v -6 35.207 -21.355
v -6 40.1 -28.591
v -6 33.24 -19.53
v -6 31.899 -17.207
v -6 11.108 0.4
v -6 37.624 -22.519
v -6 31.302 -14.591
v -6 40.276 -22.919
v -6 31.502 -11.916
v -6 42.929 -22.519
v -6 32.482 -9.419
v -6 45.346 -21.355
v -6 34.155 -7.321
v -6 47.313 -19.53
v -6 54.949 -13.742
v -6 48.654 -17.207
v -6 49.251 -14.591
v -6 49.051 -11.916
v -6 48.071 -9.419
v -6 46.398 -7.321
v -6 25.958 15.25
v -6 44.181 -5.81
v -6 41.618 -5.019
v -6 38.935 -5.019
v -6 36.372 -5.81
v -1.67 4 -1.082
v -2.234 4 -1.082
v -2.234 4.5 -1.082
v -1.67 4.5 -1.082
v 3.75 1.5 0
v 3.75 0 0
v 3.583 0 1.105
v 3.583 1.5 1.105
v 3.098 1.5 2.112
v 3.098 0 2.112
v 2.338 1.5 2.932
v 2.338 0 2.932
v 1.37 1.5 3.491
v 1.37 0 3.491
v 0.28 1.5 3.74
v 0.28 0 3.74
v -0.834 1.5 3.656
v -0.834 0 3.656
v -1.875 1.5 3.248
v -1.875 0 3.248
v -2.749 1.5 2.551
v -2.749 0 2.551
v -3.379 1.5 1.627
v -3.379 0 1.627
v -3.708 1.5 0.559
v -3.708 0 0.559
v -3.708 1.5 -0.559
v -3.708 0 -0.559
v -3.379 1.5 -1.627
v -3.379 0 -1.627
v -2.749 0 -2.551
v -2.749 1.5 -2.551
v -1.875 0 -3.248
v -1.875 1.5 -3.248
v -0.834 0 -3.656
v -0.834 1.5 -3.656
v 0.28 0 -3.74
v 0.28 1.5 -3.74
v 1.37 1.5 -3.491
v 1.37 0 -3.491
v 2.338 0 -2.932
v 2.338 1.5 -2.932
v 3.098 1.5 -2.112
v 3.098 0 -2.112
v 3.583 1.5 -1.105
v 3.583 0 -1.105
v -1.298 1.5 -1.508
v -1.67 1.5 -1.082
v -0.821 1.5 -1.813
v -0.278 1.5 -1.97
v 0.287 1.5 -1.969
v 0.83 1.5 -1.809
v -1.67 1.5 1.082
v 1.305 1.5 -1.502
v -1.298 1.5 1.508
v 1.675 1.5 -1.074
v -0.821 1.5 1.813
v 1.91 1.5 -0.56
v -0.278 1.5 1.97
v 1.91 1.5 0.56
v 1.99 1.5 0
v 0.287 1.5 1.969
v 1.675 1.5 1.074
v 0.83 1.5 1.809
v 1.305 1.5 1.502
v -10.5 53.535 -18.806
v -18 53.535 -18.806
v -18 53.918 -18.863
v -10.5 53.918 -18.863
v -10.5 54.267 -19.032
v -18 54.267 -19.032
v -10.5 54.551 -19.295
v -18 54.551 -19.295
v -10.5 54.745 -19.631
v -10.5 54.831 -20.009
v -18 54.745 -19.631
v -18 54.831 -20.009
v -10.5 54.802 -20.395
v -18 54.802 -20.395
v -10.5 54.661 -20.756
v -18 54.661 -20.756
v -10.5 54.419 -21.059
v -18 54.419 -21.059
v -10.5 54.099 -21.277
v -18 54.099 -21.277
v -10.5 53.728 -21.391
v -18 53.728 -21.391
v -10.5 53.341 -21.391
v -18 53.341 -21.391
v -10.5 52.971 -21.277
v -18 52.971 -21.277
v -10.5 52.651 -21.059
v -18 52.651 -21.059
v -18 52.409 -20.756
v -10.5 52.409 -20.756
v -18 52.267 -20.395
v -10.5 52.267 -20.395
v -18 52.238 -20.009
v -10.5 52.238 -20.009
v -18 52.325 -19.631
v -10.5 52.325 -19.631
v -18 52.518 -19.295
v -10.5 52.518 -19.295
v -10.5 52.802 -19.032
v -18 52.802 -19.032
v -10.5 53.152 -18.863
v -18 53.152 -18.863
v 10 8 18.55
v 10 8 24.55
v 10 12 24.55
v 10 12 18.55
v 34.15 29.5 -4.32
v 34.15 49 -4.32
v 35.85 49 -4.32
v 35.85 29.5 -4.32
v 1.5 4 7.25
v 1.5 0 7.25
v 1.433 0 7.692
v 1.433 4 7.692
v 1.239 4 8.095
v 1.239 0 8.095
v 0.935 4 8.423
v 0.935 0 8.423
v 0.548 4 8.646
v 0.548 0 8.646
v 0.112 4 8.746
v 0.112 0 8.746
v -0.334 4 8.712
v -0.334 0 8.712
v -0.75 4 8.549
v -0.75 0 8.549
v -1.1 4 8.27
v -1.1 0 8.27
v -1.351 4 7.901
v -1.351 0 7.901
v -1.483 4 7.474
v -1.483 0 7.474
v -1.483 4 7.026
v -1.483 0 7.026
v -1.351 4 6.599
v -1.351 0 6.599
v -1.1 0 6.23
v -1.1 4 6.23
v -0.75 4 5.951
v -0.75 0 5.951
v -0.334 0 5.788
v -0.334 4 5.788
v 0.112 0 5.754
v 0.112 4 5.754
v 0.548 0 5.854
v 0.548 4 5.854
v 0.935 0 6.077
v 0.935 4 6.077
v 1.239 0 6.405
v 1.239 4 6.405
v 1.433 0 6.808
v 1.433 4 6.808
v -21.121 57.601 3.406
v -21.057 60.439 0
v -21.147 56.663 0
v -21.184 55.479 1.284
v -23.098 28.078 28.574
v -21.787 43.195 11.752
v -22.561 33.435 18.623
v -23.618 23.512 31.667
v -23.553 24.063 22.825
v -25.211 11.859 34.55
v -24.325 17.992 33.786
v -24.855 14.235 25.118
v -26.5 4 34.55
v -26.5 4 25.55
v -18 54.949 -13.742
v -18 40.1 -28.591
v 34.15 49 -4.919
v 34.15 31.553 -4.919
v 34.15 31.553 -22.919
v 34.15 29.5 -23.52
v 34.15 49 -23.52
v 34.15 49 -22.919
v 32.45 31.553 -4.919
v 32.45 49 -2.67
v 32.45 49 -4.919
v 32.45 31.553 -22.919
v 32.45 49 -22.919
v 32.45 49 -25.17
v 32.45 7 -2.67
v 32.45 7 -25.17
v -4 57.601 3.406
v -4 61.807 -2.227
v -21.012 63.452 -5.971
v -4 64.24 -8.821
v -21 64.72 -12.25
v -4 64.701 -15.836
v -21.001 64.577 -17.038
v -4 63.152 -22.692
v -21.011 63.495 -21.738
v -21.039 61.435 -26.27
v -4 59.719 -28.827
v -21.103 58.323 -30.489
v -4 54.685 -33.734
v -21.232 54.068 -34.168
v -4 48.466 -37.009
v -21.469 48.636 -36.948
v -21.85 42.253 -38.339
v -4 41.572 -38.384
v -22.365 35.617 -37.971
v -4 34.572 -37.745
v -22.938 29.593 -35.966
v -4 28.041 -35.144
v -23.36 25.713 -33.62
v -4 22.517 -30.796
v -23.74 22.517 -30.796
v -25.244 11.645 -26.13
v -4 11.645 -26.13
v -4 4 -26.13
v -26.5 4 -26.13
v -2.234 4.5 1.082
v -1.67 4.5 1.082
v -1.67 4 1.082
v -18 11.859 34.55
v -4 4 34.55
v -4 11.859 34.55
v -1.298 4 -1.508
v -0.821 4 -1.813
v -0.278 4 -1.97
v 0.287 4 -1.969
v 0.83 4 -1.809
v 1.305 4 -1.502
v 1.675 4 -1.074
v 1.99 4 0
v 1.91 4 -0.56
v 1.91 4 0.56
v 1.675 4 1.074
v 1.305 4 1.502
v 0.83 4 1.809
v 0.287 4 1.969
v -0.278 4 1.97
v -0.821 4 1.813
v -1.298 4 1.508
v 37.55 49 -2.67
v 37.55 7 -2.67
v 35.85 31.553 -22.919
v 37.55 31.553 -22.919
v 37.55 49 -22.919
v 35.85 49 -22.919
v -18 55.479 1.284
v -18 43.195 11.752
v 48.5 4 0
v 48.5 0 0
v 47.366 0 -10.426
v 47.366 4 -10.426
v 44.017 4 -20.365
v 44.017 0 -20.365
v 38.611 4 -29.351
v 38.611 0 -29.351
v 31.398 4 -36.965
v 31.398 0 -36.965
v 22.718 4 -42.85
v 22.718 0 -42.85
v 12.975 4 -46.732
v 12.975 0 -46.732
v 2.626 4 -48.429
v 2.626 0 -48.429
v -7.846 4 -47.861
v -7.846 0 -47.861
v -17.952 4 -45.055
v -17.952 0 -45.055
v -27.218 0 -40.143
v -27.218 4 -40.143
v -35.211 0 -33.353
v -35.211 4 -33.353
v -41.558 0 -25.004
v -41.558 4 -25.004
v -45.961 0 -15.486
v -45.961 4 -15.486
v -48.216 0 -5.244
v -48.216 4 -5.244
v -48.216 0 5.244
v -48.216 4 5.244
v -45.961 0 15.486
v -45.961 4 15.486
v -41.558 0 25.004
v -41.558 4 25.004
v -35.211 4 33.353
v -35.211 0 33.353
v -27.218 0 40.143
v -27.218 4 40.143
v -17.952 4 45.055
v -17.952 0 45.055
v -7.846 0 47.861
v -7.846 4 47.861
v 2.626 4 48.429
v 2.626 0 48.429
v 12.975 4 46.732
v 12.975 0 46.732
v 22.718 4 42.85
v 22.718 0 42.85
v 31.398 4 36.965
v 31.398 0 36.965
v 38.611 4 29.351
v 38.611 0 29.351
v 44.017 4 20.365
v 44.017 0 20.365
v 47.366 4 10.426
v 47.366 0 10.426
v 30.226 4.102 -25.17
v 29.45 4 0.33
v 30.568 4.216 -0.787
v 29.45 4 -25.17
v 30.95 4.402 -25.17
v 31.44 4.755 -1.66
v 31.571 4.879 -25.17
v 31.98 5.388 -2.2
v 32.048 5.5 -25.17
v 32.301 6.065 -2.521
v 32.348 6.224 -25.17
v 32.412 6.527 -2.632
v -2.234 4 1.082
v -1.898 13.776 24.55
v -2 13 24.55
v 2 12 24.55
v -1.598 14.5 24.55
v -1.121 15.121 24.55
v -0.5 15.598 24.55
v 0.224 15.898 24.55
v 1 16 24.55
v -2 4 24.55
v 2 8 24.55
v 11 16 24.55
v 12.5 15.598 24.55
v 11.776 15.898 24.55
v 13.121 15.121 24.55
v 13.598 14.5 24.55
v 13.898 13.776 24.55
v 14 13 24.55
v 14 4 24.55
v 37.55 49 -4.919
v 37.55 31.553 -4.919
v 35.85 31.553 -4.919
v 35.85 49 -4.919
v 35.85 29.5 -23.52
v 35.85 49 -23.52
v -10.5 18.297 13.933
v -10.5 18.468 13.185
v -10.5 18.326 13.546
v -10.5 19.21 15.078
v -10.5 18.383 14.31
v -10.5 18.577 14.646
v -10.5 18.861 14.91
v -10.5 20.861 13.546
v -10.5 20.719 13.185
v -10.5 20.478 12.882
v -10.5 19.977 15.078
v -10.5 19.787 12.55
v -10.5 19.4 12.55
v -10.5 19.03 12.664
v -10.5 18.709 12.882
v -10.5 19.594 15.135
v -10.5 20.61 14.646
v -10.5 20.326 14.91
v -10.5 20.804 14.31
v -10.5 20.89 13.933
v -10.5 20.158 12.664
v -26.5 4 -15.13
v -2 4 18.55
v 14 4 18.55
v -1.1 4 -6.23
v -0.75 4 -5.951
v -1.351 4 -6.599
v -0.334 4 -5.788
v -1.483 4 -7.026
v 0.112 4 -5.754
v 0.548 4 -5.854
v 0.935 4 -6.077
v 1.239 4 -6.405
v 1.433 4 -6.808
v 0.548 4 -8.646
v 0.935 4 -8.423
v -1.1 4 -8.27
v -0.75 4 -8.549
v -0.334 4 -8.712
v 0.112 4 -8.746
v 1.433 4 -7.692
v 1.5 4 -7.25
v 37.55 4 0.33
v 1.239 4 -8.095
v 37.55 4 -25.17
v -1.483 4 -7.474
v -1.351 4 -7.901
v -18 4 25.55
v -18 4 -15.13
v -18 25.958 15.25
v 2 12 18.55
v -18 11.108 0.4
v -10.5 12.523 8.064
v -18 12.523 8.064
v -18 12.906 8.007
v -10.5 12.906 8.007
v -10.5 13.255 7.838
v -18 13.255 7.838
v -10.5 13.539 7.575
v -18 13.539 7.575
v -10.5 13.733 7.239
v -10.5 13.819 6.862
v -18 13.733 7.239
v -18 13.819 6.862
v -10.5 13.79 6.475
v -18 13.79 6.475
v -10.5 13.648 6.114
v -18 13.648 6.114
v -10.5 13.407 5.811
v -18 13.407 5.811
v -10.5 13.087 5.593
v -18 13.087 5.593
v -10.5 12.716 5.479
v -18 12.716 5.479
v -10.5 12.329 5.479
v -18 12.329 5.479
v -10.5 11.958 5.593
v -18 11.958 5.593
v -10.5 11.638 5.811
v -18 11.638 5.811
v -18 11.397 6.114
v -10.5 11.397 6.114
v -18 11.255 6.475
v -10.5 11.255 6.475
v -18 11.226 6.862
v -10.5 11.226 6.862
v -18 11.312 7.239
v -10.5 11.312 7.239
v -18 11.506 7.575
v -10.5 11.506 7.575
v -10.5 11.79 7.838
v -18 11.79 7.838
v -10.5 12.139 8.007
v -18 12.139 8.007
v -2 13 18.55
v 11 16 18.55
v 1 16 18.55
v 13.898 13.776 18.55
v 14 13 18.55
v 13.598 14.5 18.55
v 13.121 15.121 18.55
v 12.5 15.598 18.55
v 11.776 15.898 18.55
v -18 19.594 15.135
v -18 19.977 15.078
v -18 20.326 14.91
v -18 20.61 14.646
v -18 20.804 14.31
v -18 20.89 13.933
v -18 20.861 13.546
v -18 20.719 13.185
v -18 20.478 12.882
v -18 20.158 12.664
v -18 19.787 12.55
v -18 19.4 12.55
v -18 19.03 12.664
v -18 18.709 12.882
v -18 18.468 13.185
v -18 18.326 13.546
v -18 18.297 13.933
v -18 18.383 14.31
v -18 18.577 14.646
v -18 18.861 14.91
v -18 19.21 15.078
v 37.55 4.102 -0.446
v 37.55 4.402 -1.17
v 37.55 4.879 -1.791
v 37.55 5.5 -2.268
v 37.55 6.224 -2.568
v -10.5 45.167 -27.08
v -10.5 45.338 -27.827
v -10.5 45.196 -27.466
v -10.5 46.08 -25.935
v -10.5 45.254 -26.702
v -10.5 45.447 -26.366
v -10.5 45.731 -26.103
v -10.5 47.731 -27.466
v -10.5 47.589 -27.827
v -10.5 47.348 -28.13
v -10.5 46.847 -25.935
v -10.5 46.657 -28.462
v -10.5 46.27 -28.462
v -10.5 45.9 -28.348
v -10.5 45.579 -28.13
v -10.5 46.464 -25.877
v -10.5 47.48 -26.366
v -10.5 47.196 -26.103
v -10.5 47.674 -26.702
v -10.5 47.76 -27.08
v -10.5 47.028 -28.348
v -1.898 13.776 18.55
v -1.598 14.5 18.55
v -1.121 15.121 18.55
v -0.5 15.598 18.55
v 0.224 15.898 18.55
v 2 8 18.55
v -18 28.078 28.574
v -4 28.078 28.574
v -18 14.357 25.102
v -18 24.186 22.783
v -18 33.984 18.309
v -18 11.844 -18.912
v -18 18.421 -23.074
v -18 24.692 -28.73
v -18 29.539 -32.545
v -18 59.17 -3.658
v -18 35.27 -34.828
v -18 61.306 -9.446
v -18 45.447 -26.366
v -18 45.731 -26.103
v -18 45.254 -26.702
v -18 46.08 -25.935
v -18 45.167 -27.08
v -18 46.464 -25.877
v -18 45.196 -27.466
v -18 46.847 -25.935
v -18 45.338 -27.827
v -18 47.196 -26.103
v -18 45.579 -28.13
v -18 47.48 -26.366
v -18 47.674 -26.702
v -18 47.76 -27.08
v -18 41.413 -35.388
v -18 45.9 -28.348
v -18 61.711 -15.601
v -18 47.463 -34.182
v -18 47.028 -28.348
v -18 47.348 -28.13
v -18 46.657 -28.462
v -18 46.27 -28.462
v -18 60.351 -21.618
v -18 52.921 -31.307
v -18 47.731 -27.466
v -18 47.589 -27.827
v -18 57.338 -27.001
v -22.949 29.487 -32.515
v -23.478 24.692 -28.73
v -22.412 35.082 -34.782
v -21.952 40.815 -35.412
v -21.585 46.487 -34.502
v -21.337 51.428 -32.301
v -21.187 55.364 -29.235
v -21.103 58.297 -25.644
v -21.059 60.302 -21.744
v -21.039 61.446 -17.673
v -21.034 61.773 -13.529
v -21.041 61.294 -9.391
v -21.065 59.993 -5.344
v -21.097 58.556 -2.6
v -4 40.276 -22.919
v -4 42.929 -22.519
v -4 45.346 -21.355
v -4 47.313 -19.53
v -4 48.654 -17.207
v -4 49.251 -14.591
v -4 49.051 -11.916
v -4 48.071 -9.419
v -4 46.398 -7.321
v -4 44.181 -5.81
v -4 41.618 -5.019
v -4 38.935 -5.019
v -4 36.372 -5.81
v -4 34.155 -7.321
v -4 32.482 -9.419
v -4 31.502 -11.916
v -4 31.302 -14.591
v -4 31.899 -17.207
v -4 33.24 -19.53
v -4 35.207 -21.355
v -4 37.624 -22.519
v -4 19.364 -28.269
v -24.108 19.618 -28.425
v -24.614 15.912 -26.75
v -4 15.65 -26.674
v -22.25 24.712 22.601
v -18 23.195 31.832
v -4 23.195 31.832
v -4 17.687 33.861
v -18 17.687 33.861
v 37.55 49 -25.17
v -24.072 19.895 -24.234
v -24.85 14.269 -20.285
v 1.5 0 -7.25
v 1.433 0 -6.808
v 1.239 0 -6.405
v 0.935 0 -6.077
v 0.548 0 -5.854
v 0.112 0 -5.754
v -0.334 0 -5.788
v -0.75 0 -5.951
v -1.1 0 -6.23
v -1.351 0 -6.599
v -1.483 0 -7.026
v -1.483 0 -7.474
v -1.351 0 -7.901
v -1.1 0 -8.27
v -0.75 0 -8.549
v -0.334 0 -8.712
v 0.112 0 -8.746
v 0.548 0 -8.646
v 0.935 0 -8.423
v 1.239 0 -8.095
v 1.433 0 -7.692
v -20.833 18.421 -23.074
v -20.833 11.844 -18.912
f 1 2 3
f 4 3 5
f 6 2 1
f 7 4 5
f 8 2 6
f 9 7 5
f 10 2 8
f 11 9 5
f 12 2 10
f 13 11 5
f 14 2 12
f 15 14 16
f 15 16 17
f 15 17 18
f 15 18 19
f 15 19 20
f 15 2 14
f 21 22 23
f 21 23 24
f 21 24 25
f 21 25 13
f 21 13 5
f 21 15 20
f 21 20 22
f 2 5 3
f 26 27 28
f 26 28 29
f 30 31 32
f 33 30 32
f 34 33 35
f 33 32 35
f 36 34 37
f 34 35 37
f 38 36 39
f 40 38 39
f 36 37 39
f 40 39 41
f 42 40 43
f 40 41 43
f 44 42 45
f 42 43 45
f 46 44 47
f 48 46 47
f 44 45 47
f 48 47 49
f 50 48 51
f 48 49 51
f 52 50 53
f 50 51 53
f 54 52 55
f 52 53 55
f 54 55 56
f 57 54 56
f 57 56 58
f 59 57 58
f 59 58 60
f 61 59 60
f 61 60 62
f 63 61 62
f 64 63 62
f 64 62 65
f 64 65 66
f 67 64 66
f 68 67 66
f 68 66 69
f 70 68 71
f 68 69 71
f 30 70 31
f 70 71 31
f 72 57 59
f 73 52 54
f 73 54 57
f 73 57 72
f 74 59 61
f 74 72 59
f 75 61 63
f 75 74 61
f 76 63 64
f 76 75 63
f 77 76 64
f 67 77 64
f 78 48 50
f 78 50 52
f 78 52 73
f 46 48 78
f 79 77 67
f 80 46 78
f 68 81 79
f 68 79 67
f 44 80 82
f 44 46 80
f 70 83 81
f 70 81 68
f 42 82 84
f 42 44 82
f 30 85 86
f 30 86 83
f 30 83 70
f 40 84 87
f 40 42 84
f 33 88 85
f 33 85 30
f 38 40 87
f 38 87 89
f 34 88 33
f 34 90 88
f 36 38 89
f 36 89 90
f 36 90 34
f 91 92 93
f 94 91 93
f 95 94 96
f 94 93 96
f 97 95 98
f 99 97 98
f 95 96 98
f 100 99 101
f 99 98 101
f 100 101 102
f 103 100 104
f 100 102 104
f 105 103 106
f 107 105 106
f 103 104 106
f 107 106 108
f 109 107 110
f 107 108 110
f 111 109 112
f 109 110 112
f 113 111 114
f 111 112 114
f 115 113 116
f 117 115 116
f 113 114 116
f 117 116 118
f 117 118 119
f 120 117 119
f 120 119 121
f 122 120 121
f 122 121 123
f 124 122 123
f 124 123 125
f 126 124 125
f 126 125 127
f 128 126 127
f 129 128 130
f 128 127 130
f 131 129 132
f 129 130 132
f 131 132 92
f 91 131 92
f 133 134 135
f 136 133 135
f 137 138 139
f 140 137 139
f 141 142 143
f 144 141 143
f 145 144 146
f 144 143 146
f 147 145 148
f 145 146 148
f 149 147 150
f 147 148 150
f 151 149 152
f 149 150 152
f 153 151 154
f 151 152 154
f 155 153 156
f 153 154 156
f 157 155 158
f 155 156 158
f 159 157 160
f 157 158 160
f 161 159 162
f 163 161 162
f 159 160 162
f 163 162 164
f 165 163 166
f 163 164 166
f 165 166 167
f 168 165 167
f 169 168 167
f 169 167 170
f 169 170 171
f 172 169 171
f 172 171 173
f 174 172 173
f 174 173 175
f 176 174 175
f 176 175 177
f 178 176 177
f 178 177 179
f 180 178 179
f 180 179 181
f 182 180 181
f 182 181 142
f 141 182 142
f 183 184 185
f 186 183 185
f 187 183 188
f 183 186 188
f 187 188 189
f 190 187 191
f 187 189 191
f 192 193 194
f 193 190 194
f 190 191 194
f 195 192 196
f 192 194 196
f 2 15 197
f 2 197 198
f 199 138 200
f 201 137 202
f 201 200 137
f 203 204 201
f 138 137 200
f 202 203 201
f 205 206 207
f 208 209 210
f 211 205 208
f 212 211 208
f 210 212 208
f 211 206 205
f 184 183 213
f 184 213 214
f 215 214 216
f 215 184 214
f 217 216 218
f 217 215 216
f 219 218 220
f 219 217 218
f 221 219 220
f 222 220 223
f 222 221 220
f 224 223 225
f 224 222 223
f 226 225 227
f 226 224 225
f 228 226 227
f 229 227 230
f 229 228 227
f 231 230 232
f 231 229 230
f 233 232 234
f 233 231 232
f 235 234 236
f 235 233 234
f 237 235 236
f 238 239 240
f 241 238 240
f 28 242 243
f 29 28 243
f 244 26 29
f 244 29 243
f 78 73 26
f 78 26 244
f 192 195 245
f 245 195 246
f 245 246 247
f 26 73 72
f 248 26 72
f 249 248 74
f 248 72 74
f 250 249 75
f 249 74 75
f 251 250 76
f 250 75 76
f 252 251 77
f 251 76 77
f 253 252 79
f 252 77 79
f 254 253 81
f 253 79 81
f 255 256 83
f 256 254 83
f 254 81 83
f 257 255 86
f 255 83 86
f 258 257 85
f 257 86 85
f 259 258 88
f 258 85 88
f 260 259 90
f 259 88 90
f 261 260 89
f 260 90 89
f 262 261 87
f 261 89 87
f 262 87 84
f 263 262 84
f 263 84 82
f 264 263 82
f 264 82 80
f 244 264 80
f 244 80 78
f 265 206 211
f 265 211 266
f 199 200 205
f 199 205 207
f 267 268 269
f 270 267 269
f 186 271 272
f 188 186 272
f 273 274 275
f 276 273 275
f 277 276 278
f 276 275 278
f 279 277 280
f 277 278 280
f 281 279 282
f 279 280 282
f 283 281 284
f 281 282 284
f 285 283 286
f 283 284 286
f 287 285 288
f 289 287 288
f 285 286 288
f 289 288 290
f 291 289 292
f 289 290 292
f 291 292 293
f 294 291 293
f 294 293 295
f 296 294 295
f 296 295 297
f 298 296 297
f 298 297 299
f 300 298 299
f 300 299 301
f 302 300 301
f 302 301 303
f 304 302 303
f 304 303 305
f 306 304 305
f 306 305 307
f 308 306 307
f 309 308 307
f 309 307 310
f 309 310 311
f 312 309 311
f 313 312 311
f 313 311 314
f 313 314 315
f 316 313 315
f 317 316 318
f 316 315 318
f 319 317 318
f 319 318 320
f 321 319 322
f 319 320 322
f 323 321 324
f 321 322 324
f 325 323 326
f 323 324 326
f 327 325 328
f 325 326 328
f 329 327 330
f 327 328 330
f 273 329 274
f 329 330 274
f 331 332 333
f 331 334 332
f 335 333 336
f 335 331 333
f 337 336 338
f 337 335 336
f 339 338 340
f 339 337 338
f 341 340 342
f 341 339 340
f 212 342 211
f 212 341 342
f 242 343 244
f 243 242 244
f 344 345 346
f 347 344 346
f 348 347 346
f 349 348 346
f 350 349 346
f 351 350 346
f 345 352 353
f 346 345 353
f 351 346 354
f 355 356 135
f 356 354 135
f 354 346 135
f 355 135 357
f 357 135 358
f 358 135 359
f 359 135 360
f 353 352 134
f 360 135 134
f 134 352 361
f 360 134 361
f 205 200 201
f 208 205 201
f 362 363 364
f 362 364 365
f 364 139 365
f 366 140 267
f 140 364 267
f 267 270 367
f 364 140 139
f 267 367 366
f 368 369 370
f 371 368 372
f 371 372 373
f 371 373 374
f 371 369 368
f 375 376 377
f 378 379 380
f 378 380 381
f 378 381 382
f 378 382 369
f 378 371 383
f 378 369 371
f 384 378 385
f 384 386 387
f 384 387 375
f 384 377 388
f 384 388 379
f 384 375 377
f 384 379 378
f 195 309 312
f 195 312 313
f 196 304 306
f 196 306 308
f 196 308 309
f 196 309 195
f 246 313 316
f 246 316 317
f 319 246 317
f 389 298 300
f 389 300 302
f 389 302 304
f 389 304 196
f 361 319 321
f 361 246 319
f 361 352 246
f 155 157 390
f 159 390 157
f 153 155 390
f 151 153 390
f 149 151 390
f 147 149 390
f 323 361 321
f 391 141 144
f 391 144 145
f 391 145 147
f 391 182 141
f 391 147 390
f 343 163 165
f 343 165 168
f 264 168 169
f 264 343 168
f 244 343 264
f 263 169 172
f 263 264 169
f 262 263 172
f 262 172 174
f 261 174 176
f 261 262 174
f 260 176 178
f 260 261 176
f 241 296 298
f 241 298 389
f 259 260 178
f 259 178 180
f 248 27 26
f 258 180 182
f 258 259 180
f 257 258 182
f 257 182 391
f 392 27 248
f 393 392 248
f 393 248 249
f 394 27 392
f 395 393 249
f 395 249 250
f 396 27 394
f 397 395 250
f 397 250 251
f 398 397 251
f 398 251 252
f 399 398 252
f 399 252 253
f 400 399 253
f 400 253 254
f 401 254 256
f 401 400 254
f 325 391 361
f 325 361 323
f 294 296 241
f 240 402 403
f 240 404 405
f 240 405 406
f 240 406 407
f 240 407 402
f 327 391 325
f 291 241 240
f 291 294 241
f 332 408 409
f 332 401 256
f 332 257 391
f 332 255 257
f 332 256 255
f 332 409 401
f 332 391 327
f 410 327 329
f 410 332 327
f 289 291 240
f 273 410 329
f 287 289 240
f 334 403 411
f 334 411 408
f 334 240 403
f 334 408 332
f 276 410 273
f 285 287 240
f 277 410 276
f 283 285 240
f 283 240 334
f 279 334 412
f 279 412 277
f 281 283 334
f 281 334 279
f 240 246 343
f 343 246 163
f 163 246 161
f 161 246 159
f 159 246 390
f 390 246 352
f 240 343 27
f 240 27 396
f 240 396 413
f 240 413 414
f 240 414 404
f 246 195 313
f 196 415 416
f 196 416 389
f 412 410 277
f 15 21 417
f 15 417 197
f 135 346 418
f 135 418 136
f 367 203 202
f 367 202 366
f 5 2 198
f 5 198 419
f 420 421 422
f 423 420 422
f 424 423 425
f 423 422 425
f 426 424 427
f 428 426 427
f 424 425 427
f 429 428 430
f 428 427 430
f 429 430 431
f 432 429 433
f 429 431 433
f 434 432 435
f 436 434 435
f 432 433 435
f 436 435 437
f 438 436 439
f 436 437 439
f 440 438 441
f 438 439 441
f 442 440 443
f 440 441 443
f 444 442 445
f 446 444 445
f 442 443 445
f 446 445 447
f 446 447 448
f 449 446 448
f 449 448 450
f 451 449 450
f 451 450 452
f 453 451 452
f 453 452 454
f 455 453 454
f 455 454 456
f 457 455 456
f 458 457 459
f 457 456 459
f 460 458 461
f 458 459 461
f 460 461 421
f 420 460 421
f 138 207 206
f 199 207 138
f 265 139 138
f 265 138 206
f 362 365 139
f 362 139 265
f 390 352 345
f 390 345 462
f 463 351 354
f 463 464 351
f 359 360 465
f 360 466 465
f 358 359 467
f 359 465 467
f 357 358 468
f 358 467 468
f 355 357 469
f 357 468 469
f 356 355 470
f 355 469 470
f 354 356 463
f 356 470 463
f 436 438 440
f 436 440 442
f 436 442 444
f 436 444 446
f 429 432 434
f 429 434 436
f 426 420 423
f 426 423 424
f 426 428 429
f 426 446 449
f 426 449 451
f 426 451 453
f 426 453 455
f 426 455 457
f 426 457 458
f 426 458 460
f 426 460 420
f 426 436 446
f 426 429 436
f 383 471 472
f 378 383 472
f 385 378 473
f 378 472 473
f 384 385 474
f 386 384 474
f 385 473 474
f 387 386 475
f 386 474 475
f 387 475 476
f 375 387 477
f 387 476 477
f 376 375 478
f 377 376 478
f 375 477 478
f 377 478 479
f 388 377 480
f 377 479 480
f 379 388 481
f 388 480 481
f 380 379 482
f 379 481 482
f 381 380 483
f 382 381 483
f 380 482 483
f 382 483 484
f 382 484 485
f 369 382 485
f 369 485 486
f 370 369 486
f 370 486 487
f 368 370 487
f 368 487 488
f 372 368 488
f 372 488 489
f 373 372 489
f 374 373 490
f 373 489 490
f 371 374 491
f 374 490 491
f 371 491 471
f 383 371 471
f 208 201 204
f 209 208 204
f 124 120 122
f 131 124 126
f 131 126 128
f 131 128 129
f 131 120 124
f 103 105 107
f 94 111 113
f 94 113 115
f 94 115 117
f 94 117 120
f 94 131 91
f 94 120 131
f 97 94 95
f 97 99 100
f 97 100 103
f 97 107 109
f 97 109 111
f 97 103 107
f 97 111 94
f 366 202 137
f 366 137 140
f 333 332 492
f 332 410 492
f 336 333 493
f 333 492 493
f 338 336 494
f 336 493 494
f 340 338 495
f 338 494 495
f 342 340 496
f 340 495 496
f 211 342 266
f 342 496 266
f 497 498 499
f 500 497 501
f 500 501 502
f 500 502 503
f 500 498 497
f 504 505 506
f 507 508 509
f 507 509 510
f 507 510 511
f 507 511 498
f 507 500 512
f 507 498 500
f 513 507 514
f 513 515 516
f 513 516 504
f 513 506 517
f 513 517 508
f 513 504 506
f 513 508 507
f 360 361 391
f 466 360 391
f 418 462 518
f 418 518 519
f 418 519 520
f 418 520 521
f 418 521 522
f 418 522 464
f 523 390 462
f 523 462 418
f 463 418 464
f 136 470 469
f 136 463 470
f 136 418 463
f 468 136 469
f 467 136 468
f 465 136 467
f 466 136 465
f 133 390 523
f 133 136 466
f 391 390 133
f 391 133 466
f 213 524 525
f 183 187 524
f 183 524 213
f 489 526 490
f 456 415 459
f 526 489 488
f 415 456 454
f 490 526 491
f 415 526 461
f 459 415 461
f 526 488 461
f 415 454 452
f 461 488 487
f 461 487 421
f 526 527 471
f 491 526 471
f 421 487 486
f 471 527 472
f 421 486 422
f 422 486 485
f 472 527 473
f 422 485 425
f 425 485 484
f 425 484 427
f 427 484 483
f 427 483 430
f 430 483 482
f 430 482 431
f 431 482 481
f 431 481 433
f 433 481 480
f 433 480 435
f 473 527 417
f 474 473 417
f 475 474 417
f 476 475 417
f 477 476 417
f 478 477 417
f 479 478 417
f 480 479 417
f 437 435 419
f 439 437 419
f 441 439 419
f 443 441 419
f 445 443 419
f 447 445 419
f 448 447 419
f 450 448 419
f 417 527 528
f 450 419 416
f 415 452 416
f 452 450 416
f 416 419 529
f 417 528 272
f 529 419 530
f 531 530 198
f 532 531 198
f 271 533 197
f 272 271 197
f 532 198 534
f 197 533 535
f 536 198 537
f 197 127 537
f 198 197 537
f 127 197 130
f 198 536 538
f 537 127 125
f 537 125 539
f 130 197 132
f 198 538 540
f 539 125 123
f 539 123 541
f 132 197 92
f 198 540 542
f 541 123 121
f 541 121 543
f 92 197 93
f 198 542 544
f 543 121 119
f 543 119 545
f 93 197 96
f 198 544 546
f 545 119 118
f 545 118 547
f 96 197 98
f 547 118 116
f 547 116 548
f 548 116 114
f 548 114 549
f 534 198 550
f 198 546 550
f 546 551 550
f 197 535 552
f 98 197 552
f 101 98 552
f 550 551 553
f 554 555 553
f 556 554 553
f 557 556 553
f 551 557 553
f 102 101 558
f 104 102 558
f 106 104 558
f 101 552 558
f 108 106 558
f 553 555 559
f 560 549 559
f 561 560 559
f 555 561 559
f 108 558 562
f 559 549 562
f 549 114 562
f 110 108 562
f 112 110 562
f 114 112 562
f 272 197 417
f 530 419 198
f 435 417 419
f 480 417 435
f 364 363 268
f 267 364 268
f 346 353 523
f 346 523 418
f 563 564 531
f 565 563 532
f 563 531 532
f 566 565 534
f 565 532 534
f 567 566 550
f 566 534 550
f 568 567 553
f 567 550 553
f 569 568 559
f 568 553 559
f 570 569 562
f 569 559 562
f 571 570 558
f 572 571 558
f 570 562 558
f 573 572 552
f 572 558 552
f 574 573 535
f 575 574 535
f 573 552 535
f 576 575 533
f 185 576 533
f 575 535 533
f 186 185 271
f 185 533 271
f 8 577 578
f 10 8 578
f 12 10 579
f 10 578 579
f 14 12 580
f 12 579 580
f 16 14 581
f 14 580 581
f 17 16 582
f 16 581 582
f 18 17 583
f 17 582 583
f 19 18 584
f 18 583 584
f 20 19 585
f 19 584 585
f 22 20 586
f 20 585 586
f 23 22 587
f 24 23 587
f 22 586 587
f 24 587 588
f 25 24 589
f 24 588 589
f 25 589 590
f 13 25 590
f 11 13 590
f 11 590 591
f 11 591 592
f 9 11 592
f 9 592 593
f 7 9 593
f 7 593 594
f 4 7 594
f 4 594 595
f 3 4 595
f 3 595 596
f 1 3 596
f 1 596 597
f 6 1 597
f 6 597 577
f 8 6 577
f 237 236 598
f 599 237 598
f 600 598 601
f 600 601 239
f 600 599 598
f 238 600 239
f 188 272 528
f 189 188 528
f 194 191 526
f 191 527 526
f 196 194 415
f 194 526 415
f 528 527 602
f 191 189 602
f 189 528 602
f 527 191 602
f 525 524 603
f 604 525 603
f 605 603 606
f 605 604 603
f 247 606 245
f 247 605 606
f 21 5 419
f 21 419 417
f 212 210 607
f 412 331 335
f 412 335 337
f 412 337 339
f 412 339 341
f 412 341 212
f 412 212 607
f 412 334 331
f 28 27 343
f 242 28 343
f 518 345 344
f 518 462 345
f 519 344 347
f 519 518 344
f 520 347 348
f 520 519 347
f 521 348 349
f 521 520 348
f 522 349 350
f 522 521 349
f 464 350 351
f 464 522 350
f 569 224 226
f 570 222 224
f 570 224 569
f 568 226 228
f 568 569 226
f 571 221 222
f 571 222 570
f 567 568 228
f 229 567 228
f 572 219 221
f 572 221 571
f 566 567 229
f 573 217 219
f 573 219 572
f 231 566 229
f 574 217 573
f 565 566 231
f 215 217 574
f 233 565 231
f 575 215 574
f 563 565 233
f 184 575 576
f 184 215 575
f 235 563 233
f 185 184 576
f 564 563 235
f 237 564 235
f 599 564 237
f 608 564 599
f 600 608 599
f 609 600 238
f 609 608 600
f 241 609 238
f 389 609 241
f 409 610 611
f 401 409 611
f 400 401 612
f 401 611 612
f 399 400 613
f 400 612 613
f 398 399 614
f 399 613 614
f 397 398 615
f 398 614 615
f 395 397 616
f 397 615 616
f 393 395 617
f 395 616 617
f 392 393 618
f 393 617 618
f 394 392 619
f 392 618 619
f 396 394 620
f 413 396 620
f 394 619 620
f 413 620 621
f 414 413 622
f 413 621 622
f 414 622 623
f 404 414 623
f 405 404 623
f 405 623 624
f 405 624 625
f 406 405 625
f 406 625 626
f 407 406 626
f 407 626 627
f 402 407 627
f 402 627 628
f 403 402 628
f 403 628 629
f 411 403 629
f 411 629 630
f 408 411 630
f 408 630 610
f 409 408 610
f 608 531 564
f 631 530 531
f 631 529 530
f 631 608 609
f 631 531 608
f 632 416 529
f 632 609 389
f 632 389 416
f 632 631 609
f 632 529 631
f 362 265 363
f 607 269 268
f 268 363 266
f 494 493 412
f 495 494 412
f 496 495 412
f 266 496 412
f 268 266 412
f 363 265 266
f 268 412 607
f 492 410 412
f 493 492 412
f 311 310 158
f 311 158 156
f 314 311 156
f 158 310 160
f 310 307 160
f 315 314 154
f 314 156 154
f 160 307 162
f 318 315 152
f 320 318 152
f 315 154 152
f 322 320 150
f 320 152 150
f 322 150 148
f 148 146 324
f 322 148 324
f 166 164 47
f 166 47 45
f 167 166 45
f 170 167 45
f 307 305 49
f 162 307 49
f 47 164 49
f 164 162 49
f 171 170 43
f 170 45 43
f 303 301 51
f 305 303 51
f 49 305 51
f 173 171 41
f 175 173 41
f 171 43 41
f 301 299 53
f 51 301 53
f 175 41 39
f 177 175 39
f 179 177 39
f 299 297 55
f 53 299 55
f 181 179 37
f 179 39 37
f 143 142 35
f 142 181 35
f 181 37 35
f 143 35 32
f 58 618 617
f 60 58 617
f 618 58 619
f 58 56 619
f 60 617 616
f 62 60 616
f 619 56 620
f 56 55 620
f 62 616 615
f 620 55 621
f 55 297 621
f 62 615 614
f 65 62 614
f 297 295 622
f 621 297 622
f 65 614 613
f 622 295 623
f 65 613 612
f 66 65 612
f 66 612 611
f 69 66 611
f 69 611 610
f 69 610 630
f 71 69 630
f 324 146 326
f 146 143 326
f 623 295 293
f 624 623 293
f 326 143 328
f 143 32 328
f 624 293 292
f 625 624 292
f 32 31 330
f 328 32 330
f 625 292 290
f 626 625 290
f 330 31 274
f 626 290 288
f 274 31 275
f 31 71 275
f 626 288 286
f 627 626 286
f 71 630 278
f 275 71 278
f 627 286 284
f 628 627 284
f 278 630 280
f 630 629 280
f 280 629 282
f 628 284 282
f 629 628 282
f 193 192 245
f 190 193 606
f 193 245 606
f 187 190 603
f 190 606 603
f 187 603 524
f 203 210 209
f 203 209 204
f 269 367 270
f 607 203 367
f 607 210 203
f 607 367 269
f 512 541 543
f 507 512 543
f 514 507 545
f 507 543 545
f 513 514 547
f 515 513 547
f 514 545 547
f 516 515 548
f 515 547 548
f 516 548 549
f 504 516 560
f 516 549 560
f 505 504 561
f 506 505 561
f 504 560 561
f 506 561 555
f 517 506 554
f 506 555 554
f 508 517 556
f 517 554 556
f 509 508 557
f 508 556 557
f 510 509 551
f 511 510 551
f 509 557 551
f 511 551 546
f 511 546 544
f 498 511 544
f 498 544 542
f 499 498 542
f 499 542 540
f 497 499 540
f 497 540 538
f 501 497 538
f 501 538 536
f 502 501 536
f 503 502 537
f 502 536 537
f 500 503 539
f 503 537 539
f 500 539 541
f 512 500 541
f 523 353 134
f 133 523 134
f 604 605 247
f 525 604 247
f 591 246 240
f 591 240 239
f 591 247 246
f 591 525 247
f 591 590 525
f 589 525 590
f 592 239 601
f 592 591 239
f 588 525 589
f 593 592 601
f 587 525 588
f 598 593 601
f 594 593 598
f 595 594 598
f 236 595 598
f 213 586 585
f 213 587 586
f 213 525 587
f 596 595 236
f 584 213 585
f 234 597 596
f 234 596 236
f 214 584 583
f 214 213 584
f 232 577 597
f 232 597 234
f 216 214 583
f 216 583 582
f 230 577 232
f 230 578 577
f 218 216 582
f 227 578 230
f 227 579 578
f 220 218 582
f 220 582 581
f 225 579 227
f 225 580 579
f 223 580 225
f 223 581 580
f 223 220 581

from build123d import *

# Parameters (mm, degrees)
SKETCH2_R                = 48.5
BOSS_EXTRUDE1_DEPTH      = 4
SKETCH4_R                = 1.5
CUT_EXTRUDE2_DEPTH       = 5
SKETCH5_R                = 3.75
CUT_EXTRUDE3_DEPTH       = 1.5
BOSS_EXTRUDE2_DEPTH      = 14
CUT_EXTRUDE5_REACH       = 44.5
SKETCH9_R                = 1.3
CUT_EXTRUDE6_DEPTH       = 7.5
CUT_EXTRUDE9_REACH       = 46.5
SKETCH11_R               = 9
BOSS_EXTRUDE7_DEPTH      = 9
BOSS_EXTRUDE7_DEPTH_BACK = 14
BOSS_EXTRUDE10_DEPTH     = 9
SKETCH27_W               = 16
SKETCH27_H               = 6
BOSS_EXTRUDE11_DEPTH     = 12
FILLET6_R                = 3
CUT_EXTRUDE16_REACH      = 75.05
SKETCH28_W               = 8
SKETCH28_H               = 4
CUT_EXTRUDE17_DEPTH      = 49.5
CUT_EXTRUDE17_DEPTH_BACK = 49.5
CROQUIS4_W               = 5.1
CROQUIS4_H               = 22.5
SALIENTE_EXTRUIR1_DEPTH  = 45
CROQUIS5_W               = 1.7
CROQUIS5_H               = 19.2
CORTAR_EXTRUIR1_DEPTH    = 19.5
CROQUIS6_W               = 18
CROQUIS6_H               = 17.447039648
CORTAR_EXTRUIR2_DEPTH    = 19.5
REDONDEO1_R              = 3
CROQUIS7_R               = 1.99
CORTAR_EXTRUIR3_DEPTH    = 10
CROQUIS8_W               = 0.564126112
CROQUIS8_H               = 2.164439882
SALIENTE_EXTRUIR2_DEPTH  = 3


with BuildPart() as part:
    # Sketch2 → Boss-Extrude1 (new body)
    with BuildSketch(Plane(origin=(0, 0, 0), x_dir=(1, 0, 0), z_dir=(0, 1, 0))):
        Circle(SKETCH2_R)
    extrude(amount=BOSS_EXTRUDE1_DEPTH)

    # Sketch4 → Cut-Extrude2 (cut, through all)
    with BuildSketch(Plane.XZ):
        with Locations((0, 7.25)):
            Circle(SKETCH4_R)
        with Locations((0, -7.25)):
            Circle(SKETCH4_R)
    extrude(amount=-CUT_EXTRUDE2_DEPTH, mode=Mode.SUBTRACT)

    # Sketch5 → Cut-Extrude3 (cut)
    with BuildSketch(Plane.XZ):
        Circle(SKETCH5_R)
    extrude(amount=-CUT_EXTRUDE3_DEPTH, mode=Mode.SUBTRACT)

    # Sketch7 → Boss-Extrude2 (add)
    with BuildSketch(Plane(origin=(-4, 0, 0), x_dir=(0, 0, -1), z_dir=(1, 0, 0))):
        with BuildLine():
            Line((23.129947874, 4), (23.129947874, 11.644549616))
            ThreePointArc((23.129947874, 11.644549616), (24.589048403, 18.743749901), (28.729797284, 24.692011643))
            ThreePointArc((28.729797284, 24.692011643), (29.313383054, 55.284736897), (-1.284289494, 55.479275971))
            Line((-1.284289494, 55.479275971), (-27.227315747, 29.536249718))
            ThreePointArc((-27.227315747, 29.536249718), (-32.64663453, 21.425665997), (-34.549646217, 11.858580188))
            Line((-34.549646217, 11.858580188), (-34.549646217, 4))
            Line((-34.549646217, 4), (23.129947874, 4))
        make_face()
    extrude(amount=-BOSS_EXTRUDE2_DEPTH)

    # Sketch8 → Cut-Extrude5 (cut, up to next)
    with BuildSketch(Plane(origin=(-6, 0, 0), x_dir=(0, 0, -1), z_dir=(1, 0, 0)), mode=Mode.PRIVATE) as cut_extrude5_sk1:
        Polygon((-15.249648422, 25.957567857), (13.741729607, 54.948945886), (28.590972012, 40.099703481), (-0.400406017, 11.108325452), align=None)
    cut_extrude5_tool1 = extrude(cut_extrude5_sk1.sketch, amount=-CUT_EXTRUDE5_REACH, mode=Mode.PRIVATE) & part.part
    add(cut_extrude5_tool1.solids().sort_by_distance((-6, 33.028636, -6.670662))[0], mode=Mode.SUBTRACT)

    # Sketch9 → Cut-Extrude6 (cut)
    with BuildSketch(Plane.ZY.offset(18)):
        with Locations((-20.105690637, 53.534732323)):
            Circle(SKETCH9_R)
        with Locations((-27.176758449, 46.463664511)):
            Circle(SKETCH9_R)
        with Locations((6.764367048, 12.522539014)):
            Circle(SKETCH9_R)
        with Locations((13.83543486, 19.593606826)):
            Circle(SKETCH9_R)
    extrude(amount=-CUT_EXTRUDE6_DEPTH, mode=Mode.SUBTRACT)

    # Sketch11 → Cut-Extrude9 (cut, up to next)
    with BuildSketch(Plane(origin=(-4, 0, 0), x_dir=(0, 0, -1), z_dir=(1, 0, 0)), mode=Mode.PRIVATE) as cut_extrude9_sk1:
        with Locations((13.918506302, 40.276480176)):
            Circle(SKETCH11_R)
    cut_extrude9_tool1 = extrude(cut_extrude9_sk1.sketch, amount=-CUT_EXTRUDE9_REACH, mode=Mode.PRIVATE) & part.part
    add(cut_extrude9_tool1.solids().sort_by_distance((-4, 40.27648, -13.918506))[0], mode=Mode.SUBTRACT)

    # Sketch17 → Boss-Extrude7 (add, two sides)
    with BuildSketch(Plane.ZY.offset(18)) as boss_extrude7_sk:
        with BuildLine():
            ThreePointArc((34.549646217, 11.858580188), (33.008342843, 20.500891953), (28.574482006, 28.077569775))
            ThreePointArc((28.574482006, 28.077569775), (27.915386359, 28.820289685), (27.227315747, 29.536249718))
            Line((27.227315747, 29.536249718), (1.284289494, 55.479275971))
            Line((1.284289494, 55.479275971), (26.295003593, 26.127182305))
            ThreePointArc((26.295003593, 26.127182305), (30.194232218, 19.461281607), (31.549646217, 11.858580188))
            Line((31.549646217, 11.858580188), (31.549646217, 4))
            Line((31.549646217, 4), (34.549646217, 4))
            Line((34.549646217, 4), (34.549646217, 11.858580188))
        make_face()
        with BuildLine():
            Line((28.574482006, 28.077569775), (3.405609837, 57.600596315))
            ThreePointArc((3.405609837, 57.600596315), (-31.461505391, 57.378912253), (-30.796489049, 22.517434639))
            ThreePointArc((-30.796489049, 22.517434639), (-27.345864981, 17.560549854), (-26.129947874, 11.644549616))
            Line((-26.129947874, 11.644549616), (-26.129947874, 4))
            Line((-26.129947874, 4), (-23.129947874, 4))
            Line((-23.129947874, 4), (-23.129947874, 11.644549616))
            ThreePointArc((-23.129947874, 11.644549616), (-24.589048403, 18.743749901), (-28.729797284, 24.692011643))
            ThreePointArc((-28.729797284, 24.692011643), (-29.313383054, 55.284736897), (1.284289494, 55.479275971))
            Line((1.284289494, 55.479275971), (27.227315747, 29.536249718))
            ThreePointArc((27.227315747, 29.536249718), (27.915386359, 28.820289685), (28.574482006, 28.077569775))
        make_face()
    extrude(amount=BOSS_EXTRUDE7_DEPTH)
    extrude(boss_extrude7_sk.sketch, amount=-BOSS_EXTRUDE7_DEPTH_BACK)

    # Sketch25 → Boss-Extrude10 (add)
    with BuildSketch(Plane.ZY.offset(18)):
        with BuildLine():
            ThreePointArc((-28.729797284, 24.692011643), (-24.589048403, 18.743749901), (-23.129947874, 11.644549616))
            Line((-23.129947874, 11.644549616), (-23.129947874, 4))
            Line((-23.129947874, 4), (-15.129947874, 4))
            add(Edge.make_bspline(
                [(-28.729797284, 24.692011643), (-21.954867515, 18.253200081), (-19.09405247, 12.798017691), (-15.129947874, 4)],
                knots=[0, 0, 0, 0, 1, 1, 1, 1], degree=3))
        make_face()
        with BuildLine():
            add(Edge.make_bspline(
                [(11.751619577, 43.19501844), (26.551255916, 25.8264495), (25.549646217, 4)],
                knots=[0, 0, 0, 1, 1, 1], degree=2))
            Line((25.549646217, 4), (31.549646217, 4))
            Line((31.549646217, 4), (31.549646217, 11.858580188))
            ThreePointArc((31.549646217, 11.858580188), (30.194232218, 19.461281607), (26.295003593, 26.127182305))
            Line((26.295003593, 26.127182305), (11.751619577, 43.19501844))
        make_face()
    extrude(amount=BOSS_EXTRUDE10_DEPTH)

    # Sketch27 → Boss-Extrude11 (add)
    with BuildSketch(Plane(origin=(0, 4, 0), x_dir=(1, 0, 0), z_dir=(0, 1, 0))):
        with Locations((6, -21.549646217)):
            Rectangle(SKETCH27_W, SKETCH27_H)
    extrude(amount=BOSS_EXTRUDE11_DEPTH)

    # Fillet6
    fillet6_edges = [part.edges().sort_by_distance(p)[0] for p in [
        (-2, 16, 21.549646217),
        (14, 16, 21.549646217),
    ]]
    fillet(fillet6_edges, radius=FILLET6_R)

    # Sketch28 → Cut-Extrude16 (cut, up to next)
    with BuildSketch(Plane.XY.offset(24.549646217), mode=Mode.PRIVATE) as cut_extrude16_sk1:
        with Locations((6, 10)):
            Rectangle(SKETCH28_W, SKETCH28_H)
    cut_extrude16_tool1 = extrude(cut_extrude16_sk1.sketch, amount=-CUT_EXTRUDE16_REACH, mode=Mode.PRIVATE) & part.part
    add(cut_extrude16_tool1.solids().sort_by_distance((6, 10, 24.549646))[0], mode=Mode.SUBTRACT)

    # Sketch29 → Cut-Extrude17 (cut, two sides)
    with BuildSketch(Plane.XY) as cut_extrude17_sk:
        with BuildLine():
            Line((-21, 64.776480176), (-27, 64.776480176))
            Line((-27, 64.776480176), (-27, 4))
            Line((-27, 4), (-26.5, 4))
            add(Edge.make_bspline(
                [(-21, 64.776480176), (-21.220459696, 34.140901434), (-26.5, 4)],
                knots=[0, 0, 0, 1, 1, 1], degree=2))
        make_face()
    extrude(amount=CUT_EXTRUDE17_DEPTH, mode=Mode.SUBTRACT)
    extrude(cut_extrude17_sk.sketch, amount=-CUT_EXTRUDE17_DEPTH_BACK, mode=Mode.SUBTRACT)

    # Croquis4 → Saliente-Extruir1 (add)
    with BuildSketch(Plane(origin=(0, 4, 0), x_dir=(1, 0, 0), z_dir=(0, 1, 0))):
        with Locations((35, 13.919947874)):
            Rectangle(CROQUIS4_W, CROQUIS4_H)
    extrude(amount=SALIENTE_EXTRUIR1_DEPTH)

    # Croquis5 → Cortar-Extruir1 (cut)
    with BuildSketch(Plane(origin=(0, 49, 0), x_dir=(1, 0, 0), z_dir=(0, 1, 0))):
        with Locations((35, 13.919947874)):
            Rectangle(CROQUIS5_W, CROQUIS5_H)
    extrude(amount=-CORTAR_EXTRUIR1_DEPTH, mode=Mode.SUBTRACT)

    # Croquis6 → Cortar-Extruir2 (cut)
    with BuildSketch(Plane(origin=(37.55, 0, 0), x_dir=(0, 0, -1), z_dir=(1, 0, 0))):
        with Locations((13.918506302, 40.276480176)):
            Rectangle(CROQUIS6_W, CROQUIS6_H)
    extrude(amount=-CORTAR_EXTRUIR2_DEPTH, mode=Mode.SUBTRACT)

    # Redondeo1
    redondeo1_edges = [part.edges().sort_by_distance(p)[0] for p in [
        (32.45, 4, -13.919947874),
        (35, 4, -2.669947874),
    ]]
    fillet(redondeo1_edges, radius=REDONDEO1_R)

    # Croquis7 → Cortar-Extruir3 (cut)
    with BuildSketch(Plane.XZ.offset(-1.5)):
        Circle(CROQUIS7_R)
    extrude(amount=-CORTAR_EXTRUIR3_DEPTH, mode=Mode.SUBTRACT)

    # Croquis8 → Saliente-Extruir2 (add)
    with BuildSketch(Plane.XZ.offset(-1.5)):
        with Locations((-1.952063056, 0)):
            Rectangle(CROQUIS8_W, CROQUIS8_H)
    extrude(amount=-SALIENTE_EXTRUIR2_DEPTH)


solid = part.part
